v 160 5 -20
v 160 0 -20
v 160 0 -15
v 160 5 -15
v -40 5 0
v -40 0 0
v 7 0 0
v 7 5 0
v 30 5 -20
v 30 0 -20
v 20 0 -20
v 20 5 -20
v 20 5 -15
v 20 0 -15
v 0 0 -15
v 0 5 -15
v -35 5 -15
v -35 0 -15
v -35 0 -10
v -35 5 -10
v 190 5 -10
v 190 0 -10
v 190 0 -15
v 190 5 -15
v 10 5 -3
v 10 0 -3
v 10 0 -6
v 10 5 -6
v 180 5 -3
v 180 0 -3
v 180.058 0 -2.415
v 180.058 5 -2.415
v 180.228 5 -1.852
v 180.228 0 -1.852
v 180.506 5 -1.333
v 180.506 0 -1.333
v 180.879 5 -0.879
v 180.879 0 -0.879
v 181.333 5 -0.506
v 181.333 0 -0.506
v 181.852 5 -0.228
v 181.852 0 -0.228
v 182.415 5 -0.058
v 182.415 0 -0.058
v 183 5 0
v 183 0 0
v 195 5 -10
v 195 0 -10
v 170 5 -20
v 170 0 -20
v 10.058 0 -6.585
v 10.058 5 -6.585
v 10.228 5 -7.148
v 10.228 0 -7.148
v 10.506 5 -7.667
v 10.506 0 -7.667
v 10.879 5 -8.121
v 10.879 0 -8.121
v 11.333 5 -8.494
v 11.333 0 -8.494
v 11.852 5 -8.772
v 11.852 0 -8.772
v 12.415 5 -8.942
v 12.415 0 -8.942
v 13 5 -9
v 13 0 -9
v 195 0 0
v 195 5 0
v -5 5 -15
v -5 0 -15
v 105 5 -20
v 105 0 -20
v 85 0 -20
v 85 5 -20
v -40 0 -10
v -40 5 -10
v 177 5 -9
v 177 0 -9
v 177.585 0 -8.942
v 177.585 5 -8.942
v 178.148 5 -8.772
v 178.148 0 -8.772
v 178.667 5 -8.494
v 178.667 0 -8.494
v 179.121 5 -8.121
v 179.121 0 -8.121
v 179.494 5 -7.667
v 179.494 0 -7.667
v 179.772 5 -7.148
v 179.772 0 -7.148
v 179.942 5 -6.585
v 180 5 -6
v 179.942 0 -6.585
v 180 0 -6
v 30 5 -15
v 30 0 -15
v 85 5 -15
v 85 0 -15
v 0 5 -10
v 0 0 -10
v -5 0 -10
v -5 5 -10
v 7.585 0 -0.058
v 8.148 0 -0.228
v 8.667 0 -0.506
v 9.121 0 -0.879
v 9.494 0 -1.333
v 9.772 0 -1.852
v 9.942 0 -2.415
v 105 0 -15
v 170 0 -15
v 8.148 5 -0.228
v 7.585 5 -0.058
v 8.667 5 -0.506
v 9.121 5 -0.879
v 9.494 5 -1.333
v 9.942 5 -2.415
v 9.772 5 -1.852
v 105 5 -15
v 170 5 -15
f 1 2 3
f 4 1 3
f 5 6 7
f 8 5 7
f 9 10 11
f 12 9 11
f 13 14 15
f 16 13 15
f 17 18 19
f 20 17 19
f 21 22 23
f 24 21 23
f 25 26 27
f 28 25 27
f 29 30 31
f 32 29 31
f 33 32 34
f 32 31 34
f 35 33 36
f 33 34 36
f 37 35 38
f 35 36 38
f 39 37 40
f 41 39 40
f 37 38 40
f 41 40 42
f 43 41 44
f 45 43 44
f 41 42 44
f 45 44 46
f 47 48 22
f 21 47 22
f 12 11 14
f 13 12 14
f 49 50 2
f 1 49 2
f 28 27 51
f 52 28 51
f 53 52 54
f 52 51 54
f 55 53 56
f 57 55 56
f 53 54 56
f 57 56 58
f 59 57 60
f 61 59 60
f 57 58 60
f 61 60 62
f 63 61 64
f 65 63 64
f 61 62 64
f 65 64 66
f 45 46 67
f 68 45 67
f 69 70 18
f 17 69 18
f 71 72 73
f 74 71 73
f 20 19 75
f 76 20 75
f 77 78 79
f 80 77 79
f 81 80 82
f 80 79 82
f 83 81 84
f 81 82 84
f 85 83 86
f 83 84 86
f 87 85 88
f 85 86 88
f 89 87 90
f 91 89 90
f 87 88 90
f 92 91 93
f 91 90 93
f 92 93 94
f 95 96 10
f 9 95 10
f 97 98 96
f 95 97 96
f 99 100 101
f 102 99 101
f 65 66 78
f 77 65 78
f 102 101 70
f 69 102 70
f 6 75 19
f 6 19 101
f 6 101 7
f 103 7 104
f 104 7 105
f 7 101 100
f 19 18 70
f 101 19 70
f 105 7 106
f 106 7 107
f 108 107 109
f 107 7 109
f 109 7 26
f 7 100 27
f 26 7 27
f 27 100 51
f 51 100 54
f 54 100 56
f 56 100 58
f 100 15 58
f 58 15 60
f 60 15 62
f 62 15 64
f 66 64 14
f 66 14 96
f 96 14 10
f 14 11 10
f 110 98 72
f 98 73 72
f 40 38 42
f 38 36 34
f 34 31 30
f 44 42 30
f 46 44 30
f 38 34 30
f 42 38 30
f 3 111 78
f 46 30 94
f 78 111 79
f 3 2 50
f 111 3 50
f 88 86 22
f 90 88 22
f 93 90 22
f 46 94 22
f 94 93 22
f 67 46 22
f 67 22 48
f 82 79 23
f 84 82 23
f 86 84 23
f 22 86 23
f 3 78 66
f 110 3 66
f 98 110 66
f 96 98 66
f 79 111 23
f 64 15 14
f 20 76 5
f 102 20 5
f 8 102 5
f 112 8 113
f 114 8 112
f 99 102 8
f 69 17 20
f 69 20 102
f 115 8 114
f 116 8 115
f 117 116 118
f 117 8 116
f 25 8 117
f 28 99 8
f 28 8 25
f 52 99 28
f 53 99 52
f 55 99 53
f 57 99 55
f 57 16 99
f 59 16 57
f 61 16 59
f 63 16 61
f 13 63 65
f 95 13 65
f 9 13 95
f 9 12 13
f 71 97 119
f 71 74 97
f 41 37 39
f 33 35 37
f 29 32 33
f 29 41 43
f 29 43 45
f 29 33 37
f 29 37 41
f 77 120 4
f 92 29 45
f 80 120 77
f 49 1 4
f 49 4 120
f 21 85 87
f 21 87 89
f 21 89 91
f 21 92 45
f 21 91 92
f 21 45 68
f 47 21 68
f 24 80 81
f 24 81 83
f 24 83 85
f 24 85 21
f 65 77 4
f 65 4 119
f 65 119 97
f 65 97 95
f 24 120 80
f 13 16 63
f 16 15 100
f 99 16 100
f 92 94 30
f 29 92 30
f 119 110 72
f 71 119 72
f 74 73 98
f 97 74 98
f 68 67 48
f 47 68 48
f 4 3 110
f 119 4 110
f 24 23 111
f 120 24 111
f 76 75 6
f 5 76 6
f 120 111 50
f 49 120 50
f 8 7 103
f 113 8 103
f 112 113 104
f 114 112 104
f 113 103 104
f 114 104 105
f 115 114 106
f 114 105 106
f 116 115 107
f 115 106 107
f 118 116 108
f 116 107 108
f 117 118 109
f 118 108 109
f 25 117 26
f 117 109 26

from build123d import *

# Parameters (mm, degrees)
EXTRUDE_2_DEPTH = 5


with BuildPart() as part:
    # 草图1 → 凸台-拉伸2 (new body)
    with BuildSketch(Plane(origin=(0, 0, 0), x_dir=(1, 0, 0), z_dir=(0, 1, 0))):
        with BuildLine():
            Line((-5, 0), (7, 0))
            ThreePointArc((7, 0), (9.121320344, 0.878679656), (10, 3))
            Line((10, 3), (10, 6))
            ThreePointArc((10, 6), (10.878679656, 8.121320344), (13, 9))
            Line((13, 9), (177, 9))
            ThreePointArc((177, 9), (179.121320344, 8.121320344), (180, 6))
            Line((180, 6), (180, 3))
            ThreePointArc((180, 3), (180.878679656, 0.878679656), (183, 0))
            Line((183, 0), (195, 0))
            Line((195, 0), (195, 10))
            Line((195, 10), (190, 10))
            Line((190, 10), (190, 15))
            Line((190, 15), (170, 15))
            Line((170, 15), (170, 20))
            Line((170, 20), (160, 20))
            Line((160, 20), (160, 15))
            Line((160, 15), (105, 15))
            Line((105, 15), (105, 20))
            Line((105, 20), (85, 20))
            Line((85, 20), (85, 15))
            Line((85, 15), (30, 15))
            Line((30, 15), (30, 20))
            Line((30, 20), (20, 20))
            Line((20, 20), (20, 15))
            Line((20, 15), (0, 15))
            Line((0, 15), (0, 10))
            Line((0, 10), (-5, 10))
            Line((-5, 10), (-5, 15))
            Line((-5, 15), (-35, 15))
            Line((-35, 15), (-35, 10))
            Line((-35, 10), (-40, 10))
            Line((-40, 10), (-40, 0))
            Line((-40, 0), (-5, 0))
        make_face()
    extrude(amount=EXTRUDE_2_DEPTH)


solid = part.part
